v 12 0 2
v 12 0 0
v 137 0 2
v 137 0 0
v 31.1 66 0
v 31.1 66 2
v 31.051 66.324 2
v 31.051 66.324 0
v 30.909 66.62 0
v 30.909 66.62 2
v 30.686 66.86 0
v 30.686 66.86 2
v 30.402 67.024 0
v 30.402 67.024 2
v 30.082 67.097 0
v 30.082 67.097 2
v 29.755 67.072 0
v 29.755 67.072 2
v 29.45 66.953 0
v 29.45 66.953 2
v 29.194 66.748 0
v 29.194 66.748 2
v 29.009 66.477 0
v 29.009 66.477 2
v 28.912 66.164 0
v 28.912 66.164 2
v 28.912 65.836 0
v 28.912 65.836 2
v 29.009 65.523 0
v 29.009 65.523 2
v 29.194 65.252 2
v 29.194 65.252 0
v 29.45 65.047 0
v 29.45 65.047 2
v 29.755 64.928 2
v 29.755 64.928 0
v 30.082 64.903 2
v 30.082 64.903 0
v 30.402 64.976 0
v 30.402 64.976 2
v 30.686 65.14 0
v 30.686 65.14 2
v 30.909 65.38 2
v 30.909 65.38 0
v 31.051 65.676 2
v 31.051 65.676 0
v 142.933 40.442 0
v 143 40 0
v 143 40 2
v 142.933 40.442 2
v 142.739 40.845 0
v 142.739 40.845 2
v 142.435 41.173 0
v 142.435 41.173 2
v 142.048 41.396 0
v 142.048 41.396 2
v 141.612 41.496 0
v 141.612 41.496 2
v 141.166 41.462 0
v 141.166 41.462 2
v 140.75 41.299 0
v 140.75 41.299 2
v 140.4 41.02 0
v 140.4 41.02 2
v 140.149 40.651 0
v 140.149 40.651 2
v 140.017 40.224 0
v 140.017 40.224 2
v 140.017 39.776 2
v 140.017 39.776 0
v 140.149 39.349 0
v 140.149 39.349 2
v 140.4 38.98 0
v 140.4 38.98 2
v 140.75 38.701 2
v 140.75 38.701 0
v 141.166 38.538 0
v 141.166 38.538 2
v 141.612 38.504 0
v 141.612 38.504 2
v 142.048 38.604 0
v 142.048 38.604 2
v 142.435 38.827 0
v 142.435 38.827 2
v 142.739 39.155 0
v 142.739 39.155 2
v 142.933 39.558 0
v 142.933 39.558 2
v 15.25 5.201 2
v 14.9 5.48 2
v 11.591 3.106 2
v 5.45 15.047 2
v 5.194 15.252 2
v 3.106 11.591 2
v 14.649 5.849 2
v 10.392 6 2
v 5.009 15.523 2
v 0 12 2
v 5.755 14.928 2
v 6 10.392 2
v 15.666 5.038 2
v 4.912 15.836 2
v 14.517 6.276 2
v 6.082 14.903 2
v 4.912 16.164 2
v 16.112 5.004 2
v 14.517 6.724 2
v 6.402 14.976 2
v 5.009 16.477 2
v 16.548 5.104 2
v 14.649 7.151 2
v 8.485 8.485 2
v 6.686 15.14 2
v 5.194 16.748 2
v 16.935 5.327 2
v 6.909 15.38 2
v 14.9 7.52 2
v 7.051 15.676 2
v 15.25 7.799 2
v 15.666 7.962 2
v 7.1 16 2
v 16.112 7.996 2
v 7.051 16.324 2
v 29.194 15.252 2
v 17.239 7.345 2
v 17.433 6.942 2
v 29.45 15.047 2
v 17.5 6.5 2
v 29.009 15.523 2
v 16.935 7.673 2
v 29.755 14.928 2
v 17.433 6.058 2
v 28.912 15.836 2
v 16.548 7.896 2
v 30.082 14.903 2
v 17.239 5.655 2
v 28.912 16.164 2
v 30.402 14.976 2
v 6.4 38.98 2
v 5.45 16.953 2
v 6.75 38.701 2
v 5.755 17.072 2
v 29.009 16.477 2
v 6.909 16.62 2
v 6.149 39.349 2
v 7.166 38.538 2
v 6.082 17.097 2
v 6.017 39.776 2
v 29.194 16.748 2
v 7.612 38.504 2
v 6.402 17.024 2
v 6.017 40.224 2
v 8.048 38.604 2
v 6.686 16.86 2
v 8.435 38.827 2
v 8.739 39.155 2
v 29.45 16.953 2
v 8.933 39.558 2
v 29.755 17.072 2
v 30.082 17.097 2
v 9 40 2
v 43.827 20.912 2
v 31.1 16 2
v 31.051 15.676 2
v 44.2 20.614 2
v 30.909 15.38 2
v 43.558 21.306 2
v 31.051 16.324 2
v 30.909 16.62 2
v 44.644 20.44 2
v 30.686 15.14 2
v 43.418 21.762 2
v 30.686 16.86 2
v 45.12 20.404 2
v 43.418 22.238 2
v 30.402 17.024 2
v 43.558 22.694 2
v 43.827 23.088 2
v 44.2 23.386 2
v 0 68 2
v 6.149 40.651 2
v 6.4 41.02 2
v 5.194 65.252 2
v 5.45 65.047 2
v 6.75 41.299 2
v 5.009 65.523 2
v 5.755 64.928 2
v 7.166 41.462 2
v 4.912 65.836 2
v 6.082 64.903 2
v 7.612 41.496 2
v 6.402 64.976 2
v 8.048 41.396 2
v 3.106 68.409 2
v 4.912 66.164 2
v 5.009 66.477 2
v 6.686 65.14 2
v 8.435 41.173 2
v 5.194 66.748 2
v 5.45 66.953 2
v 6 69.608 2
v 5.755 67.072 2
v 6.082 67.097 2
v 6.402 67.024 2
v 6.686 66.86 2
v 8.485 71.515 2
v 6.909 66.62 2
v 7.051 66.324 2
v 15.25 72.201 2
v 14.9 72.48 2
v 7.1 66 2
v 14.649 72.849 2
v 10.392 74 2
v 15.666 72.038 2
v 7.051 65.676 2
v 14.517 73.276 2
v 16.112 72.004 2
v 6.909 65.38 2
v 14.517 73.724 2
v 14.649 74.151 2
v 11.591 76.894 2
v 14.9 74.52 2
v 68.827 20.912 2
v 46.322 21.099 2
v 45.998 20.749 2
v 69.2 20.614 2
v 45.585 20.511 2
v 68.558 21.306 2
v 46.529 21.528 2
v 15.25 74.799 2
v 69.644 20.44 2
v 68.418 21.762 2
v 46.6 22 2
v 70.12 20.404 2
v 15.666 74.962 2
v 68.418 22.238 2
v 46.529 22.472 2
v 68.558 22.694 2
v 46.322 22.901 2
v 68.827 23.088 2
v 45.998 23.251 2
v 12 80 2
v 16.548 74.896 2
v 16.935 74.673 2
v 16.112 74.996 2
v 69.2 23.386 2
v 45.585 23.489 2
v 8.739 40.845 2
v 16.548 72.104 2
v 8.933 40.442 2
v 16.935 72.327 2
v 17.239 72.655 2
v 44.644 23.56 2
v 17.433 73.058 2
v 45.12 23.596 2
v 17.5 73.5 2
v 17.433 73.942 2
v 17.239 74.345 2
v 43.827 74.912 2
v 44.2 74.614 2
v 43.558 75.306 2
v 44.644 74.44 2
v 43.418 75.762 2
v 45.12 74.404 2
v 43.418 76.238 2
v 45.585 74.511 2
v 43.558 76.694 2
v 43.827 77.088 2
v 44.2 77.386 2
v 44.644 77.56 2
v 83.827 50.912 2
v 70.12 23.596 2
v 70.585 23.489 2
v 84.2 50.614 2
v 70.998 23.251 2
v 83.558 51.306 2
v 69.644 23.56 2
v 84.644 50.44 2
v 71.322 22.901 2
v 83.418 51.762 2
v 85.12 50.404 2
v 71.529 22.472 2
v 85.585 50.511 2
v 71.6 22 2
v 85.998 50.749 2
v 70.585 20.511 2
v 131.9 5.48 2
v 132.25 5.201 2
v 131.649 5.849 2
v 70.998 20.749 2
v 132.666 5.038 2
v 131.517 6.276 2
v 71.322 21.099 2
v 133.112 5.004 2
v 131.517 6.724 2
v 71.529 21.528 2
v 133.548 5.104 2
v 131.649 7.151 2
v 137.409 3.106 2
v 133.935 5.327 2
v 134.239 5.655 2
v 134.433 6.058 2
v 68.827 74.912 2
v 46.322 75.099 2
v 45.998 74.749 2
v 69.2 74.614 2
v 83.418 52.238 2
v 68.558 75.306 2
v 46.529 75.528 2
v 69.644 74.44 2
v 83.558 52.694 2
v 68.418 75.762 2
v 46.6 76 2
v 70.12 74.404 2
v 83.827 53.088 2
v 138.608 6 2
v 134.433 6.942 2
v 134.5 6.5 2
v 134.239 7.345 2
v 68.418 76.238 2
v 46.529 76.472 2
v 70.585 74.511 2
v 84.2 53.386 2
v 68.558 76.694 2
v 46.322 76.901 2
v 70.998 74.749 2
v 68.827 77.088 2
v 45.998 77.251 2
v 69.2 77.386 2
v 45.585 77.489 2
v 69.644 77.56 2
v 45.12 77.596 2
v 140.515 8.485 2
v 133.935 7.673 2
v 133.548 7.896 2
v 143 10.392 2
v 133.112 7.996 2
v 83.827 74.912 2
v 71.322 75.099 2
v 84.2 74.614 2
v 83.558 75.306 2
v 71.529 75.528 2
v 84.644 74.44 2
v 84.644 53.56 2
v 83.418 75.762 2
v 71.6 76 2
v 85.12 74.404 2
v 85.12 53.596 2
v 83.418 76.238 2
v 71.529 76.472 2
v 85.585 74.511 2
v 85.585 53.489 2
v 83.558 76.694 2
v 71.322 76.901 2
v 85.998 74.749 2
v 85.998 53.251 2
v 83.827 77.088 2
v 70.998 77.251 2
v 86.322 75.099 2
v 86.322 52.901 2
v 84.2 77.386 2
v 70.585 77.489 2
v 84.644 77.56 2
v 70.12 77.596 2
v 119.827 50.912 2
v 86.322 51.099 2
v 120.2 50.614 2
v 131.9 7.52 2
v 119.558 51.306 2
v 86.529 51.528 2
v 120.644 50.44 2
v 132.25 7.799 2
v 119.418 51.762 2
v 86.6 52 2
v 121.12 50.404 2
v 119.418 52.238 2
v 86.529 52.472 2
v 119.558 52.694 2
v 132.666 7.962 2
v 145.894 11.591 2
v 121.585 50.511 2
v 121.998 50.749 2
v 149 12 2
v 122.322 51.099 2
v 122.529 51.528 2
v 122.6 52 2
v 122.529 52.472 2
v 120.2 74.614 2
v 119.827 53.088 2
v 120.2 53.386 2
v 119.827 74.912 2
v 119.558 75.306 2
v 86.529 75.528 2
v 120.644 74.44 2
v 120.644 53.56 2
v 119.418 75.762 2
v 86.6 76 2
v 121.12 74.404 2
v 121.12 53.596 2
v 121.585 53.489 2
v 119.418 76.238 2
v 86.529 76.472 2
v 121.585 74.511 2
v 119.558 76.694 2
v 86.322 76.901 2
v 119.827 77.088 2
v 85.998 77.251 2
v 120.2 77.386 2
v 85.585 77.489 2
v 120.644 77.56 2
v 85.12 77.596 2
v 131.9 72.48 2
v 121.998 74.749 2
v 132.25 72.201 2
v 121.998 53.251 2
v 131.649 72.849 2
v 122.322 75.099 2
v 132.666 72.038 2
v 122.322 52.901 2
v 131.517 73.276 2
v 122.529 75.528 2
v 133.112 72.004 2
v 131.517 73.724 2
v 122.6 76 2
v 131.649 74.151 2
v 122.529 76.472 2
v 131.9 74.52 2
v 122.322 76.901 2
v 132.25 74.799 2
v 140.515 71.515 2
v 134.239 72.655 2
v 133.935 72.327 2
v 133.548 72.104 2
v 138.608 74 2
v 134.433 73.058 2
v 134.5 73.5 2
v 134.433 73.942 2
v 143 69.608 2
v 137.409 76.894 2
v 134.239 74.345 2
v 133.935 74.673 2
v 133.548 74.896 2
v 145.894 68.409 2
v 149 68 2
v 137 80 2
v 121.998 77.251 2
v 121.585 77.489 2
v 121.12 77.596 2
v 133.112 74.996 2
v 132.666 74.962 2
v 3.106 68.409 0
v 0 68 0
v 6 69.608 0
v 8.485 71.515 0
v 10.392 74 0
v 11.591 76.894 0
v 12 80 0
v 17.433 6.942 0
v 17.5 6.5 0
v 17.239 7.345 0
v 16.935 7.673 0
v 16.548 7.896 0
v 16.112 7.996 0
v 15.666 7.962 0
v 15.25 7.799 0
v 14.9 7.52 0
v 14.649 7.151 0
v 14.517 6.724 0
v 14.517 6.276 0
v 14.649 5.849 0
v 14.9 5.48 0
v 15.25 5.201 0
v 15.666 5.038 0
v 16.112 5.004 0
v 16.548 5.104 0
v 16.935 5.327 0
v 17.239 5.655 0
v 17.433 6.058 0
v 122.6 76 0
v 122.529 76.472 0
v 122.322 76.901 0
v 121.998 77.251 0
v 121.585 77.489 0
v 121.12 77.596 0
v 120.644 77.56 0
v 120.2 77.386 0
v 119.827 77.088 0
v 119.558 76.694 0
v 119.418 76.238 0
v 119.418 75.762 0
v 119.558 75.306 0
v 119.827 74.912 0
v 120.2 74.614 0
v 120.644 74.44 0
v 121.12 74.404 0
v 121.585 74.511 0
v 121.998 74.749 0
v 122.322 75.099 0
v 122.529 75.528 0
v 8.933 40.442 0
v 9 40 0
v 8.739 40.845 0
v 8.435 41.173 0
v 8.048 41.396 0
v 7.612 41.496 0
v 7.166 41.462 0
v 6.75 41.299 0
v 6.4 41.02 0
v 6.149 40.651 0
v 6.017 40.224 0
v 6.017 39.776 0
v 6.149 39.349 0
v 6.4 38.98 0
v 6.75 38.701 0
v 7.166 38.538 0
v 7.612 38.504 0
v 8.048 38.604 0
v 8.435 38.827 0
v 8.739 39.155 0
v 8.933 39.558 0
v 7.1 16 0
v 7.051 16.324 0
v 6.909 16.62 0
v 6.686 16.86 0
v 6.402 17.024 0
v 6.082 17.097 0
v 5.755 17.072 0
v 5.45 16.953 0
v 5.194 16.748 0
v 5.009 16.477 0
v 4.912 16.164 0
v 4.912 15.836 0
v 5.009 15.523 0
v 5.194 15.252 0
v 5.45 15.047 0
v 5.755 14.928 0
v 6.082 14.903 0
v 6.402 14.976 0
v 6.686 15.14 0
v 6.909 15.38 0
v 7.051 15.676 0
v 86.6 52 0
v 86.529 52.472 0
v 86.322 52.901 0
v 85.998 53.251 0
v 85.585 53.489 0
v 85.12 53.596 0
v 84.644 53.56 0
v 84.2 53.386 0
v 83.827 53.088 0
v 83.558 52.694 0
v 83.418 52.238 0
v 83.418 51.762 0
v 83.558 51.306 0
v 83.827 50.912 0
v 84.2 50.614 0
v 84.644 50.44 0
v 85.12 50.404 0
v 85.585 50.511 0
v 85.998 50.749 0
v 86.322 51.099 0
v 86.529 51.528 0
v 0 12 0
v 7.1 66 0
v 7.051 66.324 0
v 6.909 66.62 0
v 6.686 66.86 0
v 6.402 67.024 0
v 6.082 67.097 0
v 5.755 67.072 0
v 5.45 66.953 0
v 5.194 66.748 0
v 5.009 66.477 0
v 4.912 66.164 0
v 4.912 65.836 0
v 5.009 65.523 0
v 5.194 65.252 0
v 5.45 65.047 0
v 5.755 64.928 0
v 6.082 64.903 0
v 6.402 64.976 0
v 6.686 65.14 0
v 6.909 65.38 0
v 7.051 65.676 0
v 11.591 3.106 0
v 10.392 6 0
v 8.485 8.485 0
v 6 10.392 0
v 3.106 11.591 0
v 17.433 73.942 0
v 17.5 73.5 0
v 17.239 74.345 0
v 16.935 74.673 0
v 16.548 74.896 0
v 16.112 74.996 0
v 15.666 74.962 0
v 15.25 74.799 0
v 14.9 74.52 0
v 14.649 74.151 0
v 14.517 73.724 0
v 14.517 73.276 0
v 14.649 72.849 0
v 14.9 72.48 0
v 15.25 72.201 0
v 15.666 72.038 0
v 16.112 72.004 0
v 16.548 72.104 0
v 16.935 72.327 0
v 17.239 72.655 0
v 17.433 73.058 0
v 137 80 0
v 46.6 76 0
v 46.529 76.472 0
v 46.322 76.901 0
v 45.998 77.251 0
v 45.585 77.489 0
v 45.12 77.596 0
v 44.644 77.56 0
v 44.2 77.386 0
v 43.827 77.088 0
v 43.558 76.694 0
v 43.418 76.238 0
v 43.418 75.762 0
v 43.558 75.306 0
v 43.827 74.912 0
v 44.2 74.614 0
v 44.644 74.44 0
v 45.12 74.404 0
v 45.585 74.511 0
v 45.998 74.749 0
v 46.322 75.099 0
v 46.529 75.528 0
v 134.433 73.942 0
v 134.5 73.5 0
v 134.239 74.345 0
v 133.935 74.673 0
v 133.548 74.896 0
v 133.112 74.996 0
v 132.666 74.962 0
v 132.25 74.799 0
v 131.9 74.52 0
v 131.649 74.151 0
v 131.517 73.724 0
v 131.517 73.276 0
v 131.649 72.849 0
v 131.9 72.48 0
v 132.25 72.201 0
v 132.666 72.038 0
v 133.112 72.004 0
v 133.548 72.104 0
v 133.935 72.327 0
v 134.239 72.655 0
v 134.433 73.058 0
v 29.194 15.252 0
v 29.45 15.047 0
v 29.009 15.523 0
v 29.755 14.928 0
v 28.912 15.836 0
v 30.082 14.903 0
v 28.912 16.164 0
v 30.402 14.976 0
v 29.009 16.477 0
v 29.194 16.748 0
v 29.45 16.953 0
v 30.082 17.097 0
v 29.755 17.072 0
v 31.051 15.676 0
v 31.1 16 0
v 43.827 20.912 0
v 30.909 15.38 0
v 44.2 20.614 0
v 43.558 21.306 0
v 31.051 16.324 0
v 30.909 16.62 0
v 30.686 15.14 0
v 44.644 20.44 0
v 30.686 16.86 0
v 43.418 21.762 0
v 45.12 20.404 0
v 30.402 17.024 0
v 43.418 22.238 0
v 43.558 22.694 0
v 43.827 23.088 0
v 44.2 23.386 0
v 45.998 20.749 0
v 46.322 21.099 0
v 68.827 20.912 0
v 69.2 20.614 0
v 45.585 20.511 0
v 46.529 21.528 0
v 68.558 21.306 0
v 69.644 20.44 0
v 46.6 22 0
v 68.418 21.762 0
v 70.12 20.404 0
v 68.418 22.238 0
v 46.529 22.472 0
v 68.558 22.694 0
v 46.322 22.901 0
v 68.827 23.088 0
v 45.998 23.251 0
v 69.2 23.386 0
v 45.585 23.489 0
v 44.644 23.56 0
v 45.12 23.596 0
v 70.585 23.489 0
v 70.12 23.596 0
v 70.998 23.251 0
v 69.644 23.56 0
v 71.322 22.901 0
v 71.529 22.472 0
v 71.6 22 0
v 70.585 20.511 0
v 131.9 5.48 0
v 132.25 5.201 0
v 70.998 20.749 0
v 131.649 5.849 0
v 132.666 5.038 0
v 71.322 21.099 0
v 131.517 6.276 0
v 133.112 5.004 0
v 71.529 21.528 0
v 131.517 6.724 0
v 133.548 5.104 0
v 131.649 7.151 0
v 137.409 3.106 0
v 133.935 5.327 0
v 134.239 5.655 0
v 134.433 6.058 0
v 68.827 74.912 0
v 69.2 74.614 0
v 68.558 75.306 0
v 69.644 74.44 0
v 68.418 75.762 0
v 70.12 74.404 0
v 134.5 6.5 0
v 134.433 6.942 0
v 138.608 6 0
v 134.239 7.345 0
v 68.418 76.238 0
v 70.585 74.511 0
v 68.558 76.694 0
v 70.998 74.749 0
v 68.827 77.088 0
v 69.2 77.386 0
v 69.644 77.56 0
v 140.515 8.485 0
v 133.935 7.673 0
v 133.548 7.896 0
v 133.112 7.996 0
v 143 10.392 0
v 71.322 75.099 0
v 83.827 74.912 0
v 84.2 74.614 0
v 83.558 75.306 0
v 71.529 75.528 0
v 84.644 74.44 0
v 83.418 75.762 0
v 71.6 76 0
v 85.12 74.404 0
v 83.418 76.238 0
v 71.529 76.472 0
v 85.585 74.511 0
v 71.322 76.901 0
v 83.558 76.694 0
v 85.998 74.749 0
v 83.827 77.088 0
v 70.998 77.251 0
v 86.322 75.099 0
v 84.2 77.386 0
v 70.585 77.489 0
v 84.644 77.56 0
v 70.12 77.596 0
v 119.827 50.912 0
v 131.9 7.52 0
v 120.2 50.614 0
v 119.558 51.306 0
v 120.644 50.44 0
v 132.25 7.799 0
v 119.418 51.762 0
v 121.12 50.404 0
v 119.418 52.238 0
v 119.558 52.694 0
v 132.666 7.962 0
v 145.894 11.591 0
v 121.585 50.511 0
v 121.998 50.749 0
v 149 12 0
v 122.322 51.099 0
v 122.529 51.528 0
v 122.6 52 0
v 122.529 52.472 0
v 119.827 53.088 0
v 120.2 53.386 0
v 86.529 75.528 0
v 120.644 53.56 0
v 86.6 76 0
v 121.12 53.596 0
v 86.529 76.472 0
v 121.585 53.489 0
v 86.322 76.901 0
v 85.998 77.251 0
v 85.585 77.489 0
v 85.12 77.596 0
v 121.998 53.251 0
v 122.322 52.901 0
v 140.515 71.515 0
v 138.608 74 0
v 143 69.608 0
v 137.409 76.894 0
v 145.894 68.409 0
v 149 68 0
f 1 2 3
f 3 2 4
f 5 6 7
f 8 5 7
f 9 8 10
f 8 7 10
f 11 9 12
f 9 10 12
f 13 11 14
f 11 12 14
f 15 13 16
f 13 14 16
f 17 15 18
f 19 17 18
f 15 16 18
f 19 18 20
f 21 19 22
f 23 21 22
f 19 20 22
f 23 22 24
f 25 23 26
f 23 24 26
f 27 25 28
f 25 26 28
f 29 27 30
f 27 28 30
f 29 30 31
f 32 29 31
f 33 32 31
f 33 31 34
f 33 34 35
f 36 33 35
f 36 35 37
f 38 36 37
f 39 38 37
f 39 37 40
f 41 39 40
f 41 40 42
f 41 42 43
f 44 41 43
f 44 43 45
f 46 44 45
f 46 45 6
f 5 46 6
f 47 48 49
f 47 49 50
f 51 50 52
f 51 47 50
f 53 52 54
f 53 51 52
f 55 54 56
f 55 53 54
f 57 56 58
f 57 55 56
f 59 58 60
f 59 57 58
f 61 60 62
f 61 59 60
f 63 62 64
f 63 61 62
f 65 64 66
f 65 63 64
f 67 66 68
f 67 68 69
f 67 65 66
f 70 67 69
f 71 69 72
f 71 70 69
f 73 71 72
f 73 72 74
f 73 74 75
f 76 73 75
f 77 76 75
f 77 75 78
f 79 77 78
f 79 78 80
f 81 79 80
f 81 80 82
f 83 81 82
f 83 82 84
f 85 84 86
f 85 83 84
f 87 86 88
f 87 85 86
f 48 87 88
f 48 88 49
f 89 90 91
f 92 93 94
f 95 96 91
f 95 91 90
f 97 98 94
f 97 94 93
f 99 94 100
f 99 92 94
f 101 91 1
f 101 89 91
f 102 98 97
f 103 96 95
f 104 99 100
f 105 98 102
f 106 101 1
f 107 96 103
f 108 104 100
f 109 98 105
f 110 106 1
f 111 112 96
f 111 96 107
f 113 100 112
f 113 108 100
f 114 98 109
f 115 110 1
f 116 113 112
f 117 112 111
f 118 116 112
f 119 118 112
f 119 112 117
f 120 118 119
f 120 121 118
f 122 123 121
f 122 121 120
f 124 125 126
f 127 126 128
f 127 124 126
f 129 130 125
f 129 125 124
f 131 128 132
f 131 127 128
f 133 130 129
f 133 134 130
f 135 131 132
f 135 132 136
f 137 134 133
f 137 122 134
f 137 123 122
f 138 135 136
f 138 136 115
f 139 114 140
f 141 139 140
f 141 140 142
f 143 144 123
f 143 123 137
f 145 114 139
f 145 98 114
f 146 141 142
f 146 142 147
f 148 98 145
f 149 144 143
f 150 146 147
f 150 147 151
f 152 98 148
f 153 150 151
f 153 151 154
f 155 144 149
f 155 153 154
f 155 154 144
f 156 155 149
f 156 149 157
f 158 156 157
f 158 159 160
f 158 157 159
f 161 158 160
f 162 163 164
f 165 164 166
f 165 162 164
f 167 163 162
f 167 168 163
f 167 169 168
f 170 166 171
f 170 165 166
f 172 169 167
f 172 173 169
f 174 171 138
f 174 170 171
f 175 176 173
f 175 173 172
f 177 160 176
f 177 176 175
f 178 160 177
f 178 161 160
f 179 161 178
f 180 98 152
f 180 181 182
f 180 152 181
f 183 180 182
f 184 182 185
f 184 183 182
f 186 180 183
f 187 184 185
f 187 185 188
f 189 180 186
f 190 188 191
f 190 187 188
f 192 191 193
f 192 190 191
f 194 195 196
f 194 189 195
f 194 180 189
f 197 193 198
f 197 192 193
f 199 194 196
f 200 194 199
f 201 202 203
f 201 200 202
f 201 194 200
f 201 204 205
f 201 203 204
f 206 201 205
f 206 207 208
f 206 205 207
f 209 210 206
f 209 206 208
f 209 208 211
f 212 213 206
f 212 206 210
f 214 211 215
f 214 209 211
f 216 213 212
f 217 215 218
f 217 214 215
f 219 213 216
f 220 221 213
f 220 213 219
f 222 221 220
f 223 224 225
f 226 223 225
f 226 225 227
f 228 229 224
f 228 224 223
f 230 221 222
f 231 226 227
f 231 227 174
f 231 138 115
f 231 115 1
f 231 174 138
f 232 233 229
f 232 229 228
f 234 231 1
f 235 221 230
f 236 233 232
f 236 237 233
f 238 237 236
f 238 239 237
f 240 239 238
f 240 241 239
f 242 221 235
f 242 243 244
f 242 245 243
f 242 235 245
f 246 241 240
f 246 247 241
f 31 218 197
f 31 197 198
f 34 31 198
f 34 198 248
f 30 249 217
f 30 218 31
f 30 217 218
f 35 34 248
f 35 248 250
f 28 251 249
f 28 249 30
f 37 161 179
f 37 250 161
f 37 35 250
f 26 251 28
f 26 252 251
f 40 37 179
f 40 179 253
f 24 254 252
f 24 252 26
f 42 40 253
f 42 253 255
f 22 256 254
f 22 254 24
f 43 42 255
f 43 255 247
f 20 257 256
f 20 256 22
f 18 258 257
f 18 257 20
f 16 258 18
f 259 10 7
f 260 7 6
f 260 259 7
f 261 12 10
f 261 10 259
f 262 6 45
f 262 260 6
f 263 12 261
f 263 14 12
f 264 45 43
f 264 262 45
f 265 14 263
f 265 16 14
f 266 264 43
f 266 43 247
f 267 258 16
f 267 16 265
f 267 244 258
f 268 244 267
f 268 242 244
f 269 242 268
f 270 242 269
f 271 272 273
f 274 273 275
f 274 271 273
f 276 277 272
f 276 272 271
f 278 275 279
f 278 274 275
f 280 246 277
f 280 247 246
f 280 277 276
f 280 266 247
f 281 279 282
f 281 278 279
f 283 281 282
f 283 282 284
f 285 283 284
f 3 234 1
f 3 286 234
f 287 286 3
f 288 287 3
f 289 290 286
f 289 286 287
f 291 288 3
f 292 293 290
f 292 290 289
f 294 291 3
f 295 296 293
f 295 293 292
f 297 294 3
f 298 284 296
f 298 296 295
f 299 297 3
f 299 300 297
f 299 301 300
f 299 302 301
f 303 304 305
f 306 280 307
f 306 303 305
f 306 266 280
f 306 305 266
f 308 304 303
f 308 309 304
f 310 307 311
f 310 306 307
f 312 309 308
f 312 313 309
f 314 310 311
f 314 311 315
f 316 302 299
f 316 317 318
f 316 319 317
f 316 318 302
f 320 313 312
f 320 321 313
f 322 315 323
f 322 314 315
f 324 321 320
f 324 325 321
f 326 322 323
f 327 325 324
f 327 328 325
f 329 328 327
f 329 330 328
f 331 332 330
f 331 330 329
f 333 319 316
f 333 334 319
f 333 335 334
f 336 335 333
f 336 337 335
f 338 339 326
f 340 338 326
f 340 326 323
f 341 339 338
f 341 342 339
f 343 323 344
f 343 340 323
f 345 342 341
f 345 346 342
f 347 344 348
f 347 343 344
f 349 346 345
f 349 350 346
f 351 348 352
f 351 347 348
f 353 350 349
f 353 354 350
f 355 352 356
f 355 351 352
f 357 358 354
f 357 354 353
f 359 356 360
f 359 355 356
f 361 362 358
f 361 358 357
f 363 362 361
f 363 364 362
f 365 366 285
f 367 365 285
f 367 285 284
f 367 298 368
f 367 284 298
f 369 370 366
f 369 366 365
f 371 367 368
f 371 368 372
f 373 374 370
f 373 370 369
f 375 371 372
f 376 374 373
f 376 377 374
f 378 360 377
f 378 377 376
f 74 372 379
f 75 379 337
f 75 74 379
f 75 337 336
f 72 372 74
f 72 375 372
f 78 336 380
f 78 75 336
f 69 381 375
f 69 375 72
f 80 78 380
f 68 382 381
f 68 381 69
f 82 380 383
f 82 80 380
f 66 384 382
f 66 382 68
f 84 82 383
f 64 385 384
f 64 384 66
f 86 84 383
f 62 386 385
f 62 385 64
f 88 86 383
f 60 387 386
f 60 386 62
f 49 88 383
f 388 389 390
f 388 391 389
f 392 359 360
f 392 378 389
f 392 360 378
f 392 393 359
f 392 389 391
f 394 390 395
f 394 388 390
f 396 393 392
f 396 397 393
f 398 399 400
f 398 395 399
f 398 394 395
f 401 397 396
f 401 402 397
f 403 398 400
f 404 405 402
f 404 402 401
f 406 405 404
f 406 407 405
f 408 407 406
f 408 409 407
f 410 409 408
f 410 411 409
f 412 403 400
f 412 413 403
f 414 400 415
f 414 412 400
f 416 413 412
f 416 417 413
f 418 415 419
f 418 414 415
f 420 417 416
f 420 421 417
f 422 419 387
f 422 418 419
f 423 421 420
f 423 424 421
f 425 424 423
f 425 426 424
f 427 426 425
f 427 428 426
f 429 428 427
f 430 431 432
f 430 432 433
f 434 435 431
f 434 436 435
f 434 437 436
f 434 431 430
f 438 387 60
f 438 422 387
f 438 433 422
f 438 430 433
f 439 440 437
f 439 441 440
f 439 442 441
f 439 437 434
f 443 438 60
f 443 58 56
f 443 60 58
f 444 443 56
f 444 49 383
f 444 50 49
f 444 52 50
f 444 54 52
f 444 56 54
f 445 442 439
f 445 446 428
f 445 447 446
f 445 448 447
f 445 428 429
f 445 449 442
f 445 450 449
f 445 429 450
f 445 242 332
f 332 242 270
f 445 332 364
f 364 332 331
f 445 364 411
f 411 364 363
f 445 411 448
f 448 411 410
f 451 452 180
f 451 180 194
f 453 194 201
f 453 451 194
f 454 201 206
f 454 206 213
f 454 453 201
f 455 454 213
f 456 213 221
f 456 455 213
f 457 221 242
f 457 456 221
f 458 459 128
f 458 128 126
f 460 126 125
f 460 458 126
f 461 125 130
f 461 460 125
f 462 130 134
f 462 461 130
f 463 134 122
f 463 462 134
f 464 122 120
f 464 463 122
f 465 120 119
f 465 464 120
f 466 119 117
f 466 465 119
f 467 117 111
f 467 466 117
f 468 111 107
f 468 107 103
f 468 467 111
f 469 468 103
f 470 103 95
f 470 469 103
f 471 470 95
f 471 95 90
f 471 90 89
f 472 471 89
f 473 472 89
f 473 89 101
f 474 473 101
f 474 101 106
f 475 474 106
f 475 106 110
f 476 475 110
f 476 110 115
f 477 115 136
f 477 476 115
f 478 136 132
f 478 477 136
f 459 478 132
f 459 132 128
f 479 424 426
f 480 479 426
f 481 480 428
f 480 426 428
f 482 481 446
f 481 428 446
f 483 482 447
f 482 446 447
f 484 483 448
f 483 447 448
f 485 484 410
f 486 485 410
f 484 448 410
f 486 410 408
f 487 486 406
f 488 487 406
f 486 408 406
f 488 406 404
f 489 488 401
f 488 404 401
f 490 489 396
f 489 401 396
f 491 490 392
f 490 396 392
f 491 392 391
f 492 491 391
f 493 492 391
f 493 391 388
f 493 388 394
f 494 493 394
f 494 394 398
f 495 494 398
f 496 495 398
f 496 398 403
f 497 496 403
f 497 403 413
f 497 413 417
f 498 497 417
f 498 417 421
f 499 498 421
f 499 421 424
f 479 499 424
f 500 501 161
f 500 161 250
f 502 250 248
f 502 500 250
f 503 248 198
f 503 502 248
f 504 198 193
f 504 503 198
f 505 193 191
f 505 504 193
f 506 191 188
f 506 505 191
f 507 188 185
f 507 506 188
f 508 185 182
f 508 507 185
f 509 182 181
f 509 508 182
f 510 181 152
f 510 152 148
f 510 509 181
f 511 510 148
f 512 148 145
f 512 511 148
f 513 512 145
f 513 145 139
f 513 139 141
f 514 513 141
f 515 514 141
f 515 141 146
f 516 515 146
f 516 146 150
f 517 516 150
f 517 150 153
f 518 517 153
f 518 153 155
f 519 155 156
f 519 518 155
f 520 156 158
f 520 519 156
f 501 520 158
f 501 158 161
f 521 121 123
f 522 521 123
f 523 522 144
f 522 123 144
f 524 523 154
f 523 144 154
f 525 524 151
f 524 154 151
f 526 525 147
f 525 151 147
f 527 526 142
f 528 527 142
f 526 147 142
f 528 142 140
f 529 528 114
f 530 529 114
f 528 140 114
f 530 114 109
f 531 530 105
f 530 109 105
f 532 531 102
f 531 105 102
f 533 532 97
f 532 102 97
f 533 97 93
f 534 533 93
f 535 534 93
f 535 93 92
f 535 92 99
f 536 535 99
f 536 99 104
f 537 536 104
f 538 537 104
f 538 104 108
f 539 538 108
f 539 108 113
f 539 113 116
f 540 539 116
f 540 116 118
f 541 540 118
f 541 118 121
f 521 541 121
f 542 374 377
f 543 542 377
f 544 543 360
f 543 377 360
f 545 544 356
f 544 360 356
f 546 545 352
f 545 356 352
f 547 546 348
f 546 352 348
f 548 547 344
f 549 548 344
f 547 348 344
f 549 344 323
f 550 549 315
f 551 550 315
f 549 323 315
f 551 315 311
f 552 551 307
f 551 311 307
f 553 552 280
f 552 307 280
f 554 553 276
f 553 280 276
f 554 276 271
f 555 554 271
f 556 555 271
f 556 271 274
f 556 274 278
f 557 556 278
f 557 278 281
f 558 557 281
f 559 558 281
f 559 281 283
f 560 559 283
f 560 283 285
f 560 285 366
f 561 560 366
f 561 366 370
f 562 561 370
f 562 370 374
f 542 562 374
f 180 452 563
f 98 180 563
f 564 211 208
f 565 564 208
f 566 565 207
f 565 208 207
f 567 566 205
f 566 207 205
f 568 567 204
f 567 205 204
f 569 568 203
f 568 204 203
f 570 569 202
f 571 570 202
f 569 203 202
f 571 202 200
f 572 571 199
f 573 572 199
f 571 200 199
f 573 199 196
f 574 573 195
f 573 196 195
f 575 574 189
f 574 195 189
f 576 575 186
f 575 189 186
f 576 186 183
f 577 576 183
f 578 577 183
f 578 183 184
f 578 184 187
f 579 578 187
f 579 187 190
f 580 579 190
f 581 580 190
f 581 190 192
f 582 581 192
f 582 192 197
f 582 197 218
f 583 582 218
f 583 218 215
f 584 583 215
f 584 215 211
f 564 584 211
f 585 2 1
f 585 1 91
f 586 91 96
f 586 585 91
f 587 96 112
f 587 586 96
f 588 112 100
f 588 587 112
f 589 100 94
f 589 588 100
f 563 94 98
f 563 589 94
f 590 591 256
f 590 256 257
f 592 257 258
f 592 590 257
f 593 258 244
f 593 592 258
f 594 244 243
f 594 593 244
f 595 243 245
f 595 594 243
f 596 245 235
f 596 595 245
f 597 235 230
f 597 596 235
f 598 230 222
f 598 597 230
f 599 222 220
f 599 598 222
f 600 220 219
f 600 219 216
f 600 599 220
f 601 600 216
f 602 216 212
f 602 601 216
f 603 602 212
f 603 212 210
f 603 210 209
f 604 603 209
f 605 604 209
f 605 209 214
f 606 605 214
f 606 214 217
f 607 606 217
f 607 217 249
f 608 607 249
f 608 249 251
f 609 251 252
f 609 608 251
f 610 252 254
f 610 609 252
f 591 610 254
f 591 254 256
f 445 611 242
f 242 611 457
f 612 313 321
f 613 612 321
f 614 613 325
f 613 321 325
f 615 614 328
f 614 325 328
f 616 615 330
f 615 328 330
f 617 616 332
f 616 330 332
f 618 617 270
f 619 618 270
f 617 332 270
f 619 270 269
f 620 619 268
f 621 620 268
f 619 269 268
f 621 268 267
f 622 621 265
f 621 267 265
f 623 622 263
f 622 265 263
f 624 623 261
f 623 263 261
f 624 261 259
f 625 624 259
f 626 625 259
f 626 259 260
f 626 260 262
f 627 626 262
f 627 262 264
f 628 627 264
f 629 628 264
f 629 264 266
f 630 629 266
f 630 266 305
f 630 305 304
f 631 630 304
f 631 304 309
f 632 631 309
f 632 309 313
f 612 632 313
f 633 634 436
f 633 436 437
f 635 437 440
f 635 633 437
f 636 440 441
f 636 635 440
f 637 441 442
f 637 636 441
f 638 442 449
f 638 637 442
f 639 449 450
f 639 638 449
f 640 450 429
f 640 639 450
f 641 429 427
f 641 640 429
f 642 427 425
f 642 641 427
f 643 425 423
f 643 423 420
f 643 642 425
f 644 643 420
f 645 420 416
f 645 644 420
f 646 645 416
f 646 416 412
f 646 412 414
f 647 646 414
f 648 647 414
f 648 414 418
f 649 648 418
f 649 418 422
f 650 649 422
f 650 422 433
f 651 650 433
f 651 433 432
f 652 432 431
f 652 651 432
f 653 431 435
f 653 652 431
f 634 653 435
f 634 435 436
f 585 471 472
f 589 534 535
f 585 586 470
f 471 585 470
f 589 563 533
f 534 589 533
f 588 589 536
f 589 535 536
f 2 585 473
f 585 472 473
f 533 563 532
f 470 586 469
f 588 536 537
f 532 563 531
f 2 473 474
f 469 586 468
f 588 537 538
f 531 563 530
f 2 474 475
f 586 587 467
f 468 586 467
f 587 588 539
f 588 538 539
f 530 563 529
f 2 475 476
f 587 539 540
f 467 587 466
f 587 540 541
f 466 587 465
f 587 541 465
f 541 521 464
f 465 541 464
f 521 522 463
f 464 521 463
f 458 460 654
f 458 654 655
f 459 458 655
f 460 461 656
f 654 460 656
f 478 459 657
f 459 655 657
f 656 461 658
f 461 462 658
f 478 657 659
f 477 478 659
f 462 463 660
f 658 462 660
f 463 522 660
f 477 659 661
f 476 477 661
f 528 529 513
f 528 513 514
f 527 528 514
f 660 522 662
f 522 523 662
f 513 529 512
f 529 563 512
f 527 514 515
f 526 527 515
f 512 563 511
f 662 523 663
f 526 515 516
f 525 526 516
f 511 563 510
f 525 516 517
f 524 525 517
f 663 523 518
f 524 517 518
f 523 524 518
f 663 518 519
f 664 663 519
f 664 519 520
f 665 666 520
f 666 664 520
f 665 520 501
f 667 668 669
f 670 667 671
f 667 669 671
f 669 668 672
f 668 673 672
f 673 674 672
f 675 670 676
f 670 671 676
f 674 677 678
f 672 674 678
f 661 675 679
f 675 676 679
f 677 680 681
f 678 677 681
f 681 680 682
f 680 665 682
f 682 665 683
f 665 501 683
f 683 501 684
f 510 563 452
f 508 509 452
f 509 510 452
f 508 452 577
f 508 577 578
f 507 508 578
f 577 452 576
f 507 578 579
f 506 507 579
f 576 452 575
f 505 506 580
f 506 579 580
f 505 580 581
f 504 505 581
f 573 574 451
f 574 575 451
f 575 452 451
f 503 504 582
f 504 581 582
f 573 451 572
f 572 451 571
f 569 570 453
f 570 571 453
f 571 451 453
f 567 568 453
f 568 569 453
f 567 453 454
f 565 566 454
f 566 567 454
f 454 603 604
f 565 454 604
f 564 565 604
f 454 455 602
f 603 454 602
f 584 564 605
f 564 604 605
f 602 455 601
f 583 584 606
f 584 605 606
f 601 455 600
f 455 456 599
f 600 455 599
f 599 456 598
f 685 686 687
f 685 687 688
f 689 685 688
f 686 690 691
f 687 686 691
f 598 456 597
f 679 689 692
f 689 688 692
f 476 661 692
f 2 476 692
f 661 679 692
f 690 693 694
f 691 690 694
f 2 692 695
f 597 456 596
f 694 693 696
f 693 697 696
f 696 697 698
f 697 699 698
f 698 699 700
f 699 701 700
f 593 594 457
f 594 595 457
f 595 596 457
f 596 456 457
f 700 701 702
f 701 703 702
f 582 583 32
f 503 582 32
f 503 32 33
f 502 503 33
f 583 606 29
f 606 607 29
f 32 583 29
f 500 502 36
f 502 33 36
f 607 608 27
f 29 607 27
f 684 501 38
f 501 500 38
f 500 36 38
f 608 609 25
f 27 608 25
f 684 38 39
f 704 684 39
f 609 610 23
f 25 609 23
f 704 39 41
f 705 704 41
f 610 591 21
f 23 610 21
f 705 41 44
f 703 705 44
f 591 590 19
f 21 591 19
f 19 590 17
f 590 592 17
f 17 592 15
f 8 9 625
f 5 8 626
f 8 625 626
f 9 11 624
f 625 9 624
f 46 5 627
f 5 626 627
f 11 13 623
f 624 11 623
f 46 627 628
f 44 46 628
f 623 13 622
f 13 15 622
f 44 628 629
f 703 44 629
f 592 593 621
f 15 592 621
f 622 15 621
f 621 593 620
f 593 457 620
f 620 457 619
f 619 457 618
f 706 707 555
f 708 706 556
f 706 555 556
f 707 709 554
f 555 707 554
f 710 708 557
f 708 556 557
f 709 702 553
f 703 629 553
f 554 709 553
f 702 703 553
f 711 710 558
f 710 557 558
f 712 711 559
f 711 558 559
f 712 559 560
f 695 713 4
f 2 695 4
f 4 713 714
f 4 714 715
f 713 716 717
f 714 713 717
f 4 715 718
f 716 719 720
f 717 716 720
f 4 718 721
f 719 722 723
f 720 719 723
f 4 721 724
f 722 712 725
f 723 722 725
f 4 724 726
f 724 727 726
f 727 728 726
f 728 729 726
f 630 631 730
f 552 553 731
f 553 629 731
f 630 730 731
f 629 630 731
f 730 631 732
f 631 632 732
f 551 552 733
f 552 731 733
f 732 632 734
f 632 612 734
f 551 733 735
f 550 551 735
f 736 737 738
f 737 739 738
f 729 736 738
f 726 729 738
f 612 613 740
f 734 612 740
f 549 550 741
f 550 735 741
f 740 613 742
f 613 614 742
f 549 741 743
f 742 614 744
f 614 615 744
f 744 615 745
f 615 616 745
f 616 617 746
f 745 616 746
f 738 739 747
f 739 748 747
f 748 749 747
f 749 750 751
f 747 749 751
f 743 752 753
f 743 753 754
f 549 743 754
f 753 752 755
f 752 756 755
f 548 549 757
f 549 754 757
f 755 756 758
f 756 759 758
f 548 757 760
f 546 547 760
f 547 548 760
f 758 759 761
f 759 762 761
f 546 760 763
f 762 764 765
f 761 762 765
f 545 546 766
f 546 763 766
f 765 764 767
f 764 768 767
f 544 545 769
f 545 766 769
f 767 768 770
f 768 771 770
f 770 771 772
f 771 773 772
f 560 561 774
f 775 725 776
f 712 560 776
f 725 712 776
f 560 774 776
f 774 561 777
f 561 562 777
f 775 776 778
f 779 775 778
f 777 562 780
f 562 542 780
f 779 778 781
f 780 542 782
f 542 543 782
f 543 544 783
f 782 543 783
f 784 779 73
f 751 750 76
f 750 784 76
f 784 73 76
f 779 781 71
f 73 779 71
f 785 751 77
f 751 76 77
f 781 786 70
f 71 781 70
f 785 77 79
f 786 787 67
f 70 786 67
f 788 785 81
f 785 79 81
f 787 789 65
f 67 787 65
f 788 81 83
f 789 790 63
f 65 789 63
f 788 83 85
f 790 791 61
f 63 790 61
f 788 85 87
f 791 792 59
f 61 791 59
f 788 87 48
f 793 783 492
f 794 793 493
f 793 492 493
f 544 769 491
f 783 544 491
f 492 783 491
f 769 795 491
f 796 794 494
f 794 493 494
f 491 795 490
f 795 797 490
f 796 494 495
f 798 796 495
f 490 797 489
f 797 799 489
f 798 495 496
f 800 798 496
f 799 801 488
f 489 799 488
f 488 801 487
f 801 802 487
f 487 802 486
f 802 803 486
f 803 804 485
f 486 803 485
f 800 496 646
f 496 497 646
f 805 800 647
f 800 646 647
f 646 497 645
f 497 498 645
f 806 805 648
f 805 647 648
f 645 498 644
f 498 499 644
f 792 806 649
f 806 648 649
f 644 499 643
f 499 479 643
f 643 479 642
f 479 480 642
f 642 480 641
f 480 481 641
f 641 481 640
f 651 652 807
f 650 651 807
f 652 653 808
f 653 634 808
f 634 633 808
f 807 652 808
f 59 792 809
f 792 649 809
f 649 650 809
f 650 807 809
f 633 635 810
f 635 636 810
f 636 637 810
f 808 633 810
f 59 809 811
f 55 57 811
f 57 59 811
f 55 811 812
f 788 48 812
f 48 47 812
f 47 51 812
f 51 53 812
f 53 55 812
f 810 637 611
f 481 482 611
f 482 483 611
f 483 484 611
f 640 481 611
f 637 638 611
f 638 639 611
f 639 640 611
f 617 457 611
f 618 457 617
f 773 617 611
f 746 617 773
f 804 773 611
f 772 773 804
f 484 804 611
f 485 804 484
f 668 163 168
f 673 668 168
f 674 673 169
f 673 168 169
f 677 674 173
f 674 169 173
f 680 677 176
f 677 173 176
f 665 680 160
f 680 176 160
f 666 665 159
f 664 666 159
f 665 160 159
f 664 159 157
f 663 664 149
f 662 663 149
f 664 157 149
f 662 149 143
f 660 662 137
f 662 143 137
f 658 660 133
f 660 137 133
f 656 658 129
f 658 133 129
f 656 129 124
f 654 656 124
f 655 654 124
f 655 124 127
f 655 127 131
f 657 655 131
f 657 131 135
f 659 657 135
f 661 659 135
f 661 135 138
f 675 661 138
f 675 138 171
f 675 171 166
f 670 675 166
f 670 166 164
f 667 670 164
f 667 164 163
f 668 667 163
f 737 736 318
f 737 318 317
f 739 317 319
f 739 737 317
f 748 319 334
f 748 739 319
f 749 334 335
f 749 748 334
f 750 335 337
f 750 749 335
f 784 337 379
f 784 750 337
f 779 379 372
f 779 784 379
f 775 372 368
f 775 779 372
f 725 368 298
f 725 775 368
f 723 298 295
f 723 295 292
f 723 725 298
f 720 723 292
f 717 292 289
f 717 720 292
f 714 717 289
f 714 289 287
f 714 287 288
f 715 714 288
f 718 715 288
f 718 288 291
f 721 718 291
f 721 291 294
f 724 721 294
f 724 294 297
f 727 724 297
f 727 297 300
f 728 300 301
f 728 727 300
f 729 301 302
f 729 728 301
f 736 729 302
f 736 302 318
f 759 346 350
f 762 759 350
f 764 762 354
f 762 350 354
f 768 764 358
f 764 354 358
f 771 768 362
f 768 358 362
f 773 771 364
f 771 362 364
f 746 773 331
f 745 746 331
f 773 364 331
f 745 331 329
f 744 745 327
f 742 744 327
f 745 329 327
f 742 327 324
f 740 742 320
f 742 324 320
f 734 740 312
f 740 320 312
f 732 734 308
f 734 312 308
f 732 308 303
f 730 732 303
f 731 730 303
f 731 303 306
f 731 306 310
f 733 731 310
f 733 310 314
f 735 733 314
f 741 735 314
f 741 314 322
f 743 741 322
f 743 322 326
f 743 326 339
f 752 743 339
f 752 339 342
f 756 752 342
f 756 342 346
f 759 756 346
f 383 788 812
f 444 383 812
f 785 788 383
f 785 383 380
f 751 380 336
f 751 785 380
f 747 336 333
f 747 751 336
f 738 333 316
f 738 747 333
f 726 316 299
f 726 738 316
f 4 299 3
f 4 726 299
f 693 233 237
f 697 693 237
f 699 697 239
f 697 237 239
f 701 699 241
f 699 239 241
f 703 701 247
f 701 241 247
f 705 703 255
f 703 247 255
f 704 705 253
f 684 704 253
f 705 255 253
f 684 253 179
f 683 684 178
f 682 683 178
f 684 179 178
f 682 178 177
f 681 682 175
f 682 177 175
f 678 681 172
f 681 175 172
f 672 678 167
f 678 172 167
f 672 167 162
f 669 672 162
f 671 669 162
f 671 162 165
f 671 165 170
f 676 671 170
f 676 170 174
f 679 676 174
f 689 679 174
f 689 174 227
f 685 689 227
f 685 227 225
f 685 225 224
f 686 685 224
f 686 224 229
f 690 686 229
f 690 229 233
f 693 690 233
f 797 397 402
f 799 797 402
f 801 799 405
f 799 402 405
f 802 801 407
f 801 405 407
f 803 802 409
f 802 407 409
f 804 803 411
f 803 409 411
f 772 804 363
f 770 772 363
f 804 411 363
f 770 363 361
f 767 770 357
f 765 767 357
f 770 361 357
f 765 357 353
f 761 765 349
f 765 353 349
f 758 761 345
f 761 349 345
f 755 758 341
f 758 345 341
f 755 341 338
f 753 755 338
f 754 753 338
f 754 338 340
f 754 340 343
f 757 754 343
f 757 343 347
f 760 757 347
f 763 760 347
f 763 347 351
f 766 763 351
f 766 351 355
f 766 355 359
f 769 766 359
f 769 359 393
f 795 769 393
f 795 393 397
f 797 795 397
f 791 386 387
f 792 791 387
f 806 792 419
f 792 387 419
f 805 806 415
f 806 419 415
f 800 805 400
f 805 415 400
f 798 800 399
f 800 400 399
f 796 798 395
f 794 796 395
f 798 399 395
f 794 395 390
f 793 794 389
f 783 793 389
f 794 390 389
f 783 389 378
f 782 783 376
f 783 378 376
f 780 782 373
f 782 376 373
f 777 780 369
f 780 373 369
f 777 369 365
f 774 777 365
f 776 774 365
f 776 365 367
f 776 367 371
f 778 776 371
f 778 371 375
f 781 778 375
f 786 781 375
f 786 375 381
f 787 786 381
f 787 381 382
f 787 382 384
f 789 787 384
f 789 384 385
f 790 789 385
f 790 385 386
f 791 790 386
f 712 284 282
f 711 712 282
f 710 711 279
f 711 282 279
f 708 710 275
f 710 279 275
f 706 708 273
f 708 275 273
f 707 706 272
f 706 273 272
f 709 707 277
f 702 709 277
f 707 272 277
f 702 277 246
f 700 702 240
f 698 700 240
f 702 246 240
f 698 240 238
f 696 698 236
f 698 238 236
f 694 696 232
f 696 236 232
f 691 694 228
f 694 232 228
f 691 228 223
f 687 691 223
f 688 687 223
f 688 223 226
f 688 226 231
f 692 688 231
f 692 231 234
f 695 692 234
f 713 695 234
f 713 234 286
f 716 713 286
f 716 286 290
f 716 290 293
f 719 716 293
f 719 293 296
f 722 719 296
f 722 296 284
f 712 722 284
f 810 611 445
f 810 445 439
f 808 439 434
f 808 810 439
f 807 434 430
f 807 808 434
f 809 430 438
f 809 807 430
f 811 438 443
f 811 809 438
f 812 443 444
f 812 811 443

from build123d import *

# Parameters (mm, degrees)
SKETCH_R      = 1.5
PAD_DEPTH     = 2
SKETCH001_R   = 1.1
SKETCH001_R_2 = 1.6
POCKET_DEPTH  = 2.001


with BuildPart() as part:
    # Sketch → Pad (new body)
    with BuildSketch(Plane.XY):
        with BuildLine():
            Line((0, 68), (0, 12))
            ThreePointArc((12, 0), (8.485281, 8.485281), (0, 12))
            Line((12, 0), (137, 0))
            ThreePointArc((149, 12), (140.514719, 8.485281), (137, 0))
            Line((149, 12), (149, 68))
            ThreePointArc((137, 80), (140.514719, 71.514719), (149, 68))
            Line((137, 80), (12, 80))
            ThreePointArc((0, 68), (8.485281, 71.514719), (12, 80))
        make_face()
        with Locations((16, 73.5)):
            Circle(SKETCH_R, mode=Mode.SUBTRACT)
        with Locations((7.5, 40)):
            Circle(SKETCH_R, mode=Mode.SUBTRACT)
        with Locations((16, 6.5)):
            Circle(SKETCH_R, mode=Mode.SUBTRACT)
        with Locations((133, 6.5)):
            Circle(SKETCH_R, mode=Mode.SUBTRACT)
        with Locations((141.5, 40)):
            Circle(SKETCH_R, mode=Mode.SUBTRACT)
        with Locations((133, 73.5)):
            Circle(SKETCH_R, mode=Mode.SUBTRACT)
    extrude(amount=PAD_DEPTH)

    # Sketch001 (on Face16 of Pad) → Pocket (cut, through all)
    with BuildSketch(Plane.XY.offset(2)):
        with Locations((6, 66)):
            Circle(SKETCH001_R)
        with Locations((30, 66)):
            Circle(SKETCH001_R)
        with Locations((30, 16)):
            Circle(SKETCH001_R)
        with Locations((6, 16)):
            Circle(SKETCH001_R)
        with Locations((45, 22)):
            Circle(SKETCH001_R_2)
        with Locations((70, 22)):
            Circle(SKETCH001_R_2)
        with Locations((70, 76)):
            Circle(SKETCH001_R_2)
        with Locations((45, 76)):
            Circle(SKETCH001_R_2)
        with Locations((85, 76)):
            Circle(SKETCH001_R_2)
        with Locations((85, 52)):
            Circle(SKETCH001_R_2)
        with Locations((121, 52)):
            Circle(SKETCH001_R_2)
        with Locations((121, 76)):
            Circle(SKETCH001_R_2)
    extrude(amount=-POCKET_DEPTH, mode=Mode.SUBTRACT)


solid = part.part
